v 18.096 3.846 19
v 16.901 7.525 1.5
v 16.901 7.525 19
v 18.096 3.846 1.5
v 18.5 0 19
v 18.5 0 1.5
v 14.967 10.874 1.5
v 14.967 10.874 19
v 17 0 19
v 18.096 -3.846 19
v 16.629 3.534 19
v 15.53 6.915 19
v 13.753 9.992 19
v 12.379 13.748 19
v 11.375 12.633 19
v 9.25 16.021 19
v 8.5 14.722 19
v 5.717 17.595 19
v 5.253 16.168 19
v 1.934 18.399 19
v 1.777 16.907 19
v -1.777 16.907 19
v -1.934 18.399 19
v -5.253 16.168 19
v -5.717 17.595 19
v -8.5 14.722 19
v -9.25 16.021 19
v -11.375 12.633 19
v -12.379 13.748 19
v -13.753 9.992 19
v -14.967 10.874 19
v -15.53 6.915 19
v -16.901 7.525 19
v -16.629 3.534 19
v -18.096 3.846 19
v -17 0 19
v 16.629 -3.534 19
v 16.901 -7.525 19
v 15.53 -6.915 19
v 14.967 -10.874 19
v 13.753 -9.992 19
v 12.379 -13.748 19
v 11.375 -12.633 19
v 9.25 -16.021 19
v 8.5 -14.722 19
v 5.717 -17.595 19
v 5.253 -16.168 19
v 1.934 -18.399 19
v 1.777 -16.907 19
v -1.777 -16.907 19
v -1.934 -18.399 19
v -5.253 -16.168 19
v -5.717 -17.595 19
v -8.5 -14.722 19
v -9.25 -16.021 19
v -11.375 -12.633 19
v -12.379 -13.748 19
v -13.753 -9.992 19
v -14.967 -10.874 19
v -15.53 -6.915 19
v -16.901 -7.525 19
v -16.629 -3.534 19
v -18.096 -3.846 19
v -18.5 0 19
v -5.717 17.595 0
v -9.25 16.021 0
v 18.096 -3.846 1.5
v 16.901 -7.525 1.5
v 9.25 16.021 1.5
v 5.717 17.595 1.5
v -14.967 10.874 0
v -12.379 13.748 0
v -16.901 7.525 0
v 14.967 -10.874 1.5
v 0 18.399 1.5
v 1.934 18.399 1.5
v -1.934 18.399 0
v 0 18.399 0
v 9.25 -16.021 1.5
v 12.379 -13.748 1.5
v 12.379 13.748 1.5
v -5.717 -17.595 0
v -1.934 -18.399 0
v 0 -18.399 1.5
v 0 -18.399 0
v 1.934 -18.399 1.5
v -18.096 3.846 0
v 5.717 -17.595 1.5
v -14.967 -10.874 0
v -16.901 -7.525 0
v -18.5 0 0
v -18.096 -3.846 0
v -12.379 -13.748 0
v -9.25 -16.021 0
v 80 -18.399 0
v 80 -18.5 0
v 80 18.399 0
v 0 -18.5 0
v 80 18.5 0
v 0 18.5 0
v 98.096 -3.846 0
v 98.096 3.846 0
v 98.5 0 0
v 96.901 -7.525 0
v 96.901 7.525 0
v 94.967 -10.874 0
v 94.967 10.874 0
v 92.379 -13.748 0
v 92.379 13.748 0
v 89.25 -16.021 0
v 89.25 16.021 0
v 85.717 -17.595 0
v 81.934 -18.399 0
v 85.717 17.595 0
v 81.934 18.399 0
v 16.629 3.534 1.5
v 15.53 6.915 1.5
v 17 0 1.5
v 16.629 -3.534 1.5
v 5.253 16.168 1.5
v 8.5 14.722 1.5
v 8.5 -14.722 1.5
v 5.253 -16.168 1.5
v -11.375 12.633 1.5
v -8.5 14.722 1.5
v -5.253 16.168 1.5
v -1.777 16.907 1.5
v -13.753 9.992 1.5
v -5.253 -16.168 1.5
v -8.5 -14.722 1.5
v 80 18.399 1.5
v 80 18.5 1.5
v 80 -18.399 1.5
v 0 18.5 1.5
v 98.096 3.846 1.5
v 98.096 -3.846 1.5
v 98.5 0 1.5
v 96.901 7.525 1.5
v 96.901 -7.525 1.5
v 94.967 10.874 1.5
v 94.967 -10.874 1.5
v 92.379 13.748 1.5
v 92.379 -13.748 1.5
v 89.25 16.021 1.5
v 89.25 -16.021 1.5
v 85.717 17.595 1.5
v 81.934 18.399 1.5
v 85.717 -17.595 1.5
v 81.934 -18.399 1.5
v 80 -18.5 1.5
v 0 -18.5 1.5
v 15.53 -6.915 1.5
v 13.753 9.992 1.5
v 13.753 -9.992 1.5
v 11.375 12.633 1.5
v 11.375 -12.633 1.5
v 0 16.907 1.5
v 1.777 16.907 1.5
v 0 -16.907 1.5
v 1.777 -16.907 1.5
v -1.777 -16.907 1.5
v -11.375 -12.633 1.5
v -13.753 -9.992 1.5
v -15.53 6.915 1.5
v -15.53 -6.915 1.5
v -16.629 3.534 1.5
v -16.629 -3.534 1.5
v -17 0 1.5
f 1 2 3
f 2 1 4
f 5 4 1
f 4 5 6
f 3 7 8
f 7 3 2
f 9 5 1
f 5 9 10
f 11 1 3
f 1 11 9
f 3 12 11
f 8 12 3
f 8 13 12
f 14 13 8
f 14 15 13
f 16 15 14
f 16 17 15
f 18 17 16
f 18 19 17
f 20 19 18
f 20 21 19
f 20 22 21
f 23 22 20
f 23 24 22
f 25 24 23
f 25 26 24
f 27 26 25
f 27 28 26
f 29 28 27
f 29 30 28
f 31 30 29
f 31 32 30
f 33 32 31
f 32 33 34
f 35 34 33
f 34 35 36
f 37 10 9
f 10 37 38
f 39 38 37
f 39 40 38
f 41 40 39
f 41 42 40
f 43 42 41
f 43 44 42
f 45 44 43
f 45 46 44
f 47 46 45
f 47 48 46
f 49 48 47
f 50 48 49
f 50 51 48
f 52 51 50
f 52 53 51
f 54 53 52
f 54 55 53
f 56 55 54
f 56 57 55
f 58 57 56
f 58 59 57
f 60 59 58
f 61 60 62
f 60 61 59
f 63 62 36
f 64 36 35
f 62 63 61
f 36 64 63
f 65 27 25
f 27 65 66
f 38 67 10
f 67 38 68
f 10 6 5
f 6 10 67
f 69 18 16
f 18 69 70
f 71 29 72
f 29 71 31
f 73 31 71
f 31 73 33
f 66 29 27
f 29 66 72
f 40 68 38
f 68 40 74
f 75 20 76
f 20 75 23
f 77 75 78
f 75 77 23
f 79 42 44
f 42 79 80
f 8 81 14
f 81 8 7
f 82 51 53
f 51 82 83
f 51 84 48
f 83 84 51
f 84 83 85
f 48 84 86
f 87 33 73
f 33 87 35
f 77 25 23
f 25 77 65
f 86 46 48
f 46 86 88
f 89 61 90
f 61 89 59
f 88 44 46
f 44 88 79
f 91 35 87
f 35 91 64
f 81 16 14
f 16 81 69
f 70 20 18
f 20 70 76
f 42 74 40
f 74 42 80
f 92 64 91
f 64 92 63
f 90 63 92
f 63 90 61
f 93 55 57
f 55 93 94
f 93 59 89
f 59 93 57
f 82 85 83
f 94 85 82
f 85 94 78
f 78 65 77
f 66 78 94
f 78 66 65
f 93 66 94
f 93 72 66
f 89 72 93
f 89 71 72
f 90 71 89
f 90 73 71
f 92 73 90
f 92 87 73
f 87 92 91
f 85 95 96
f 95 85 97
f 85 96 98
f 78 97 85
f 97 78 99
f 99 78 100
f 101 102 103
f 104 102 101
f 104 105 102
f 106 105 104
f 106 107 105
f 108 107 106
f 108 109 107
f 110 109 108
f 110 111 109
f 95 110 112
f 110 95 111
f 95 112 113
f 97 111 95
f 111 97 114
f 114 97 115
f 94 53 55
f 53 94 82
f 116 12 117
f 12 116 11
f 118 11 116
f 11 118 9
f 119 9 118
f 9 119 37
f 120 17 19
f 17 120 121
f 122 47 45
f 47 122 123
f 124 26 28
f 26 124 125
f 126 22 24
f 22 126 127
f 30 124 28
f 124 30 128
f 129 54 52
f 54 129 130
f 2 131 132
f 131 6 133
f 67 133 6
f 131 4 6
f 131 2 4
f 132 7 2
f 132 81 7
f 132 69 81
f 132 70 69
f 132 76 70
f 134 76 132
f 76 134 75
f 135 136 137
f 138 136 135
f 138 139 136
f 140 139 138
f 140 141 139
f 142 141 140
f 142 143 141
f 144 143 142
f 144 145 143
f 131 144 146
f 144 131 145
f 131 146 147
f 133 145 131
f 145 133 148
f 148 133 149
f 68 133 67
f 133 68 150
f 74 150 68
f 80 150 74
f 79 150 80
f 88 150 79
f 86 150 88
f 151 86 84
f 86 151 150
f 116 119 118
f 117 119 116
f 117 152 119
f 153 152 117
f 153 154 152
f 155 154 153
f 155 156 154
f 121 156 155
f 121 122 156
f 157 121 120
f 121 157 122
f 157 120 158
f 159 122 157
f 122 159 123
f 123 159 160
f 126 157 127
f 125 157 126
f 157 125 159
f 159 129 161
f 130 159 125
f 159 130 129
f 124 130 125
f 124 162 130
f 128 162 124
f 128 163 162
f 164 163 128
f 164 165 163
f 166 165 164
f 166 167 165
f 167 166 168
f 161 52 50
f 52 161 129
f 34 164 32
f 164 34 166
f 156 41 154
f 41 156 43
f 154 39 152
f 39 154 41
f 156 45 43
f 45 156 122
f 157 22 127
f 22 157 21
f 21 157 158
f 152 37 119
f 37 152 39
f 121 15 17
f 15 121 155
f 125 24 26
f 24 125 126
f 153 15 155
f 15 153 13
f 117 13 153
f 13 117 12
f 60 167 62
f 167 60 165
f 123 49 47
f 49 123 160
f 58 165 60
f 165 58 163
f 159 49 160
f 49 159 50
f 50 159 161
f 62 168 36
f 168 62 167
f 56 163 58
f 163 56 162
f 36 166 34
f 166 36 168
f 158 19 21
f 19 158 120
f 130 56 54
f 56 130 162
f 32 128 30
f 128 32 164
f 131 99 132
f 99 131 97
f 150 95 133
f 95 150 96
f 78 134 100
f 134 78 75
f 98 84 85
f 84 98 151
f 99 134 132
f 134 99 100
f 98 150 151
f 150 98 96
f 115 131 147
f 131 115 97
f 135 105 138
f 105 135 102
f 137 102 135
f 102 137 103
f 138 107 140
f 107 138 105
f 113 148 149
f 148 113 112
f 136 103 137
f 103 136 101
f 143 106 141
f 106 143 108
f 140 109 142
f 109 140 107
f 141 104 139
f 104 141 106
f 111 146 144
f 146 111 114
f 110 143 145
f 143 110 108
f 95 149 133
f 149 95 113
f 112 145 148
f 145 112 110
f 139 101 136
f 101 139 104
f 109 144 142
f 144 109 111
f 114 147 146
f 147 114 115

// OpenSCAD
wall_thickness=1.5;


module cup()
{
    difference ()
    {
        cylinder(h = 19, r = 37/2);
        translate([0,0,wall_thickness])
        cylinder(h = 19-wall_thickness+3, r= 37/2-wall_thickness);
    }
}

handle_length = 80;
handle_width = 37;

module handle()
{
cube([handle_length, 37, wall_thickness], center=true); 
translate([handle_length/2, 0,0])
    cylinder(h=wall_thickness, r = handle_width/2,center=true);   
}


cup();
translate([handle_length/2, 0,wall_thickness/2])
      handle();
